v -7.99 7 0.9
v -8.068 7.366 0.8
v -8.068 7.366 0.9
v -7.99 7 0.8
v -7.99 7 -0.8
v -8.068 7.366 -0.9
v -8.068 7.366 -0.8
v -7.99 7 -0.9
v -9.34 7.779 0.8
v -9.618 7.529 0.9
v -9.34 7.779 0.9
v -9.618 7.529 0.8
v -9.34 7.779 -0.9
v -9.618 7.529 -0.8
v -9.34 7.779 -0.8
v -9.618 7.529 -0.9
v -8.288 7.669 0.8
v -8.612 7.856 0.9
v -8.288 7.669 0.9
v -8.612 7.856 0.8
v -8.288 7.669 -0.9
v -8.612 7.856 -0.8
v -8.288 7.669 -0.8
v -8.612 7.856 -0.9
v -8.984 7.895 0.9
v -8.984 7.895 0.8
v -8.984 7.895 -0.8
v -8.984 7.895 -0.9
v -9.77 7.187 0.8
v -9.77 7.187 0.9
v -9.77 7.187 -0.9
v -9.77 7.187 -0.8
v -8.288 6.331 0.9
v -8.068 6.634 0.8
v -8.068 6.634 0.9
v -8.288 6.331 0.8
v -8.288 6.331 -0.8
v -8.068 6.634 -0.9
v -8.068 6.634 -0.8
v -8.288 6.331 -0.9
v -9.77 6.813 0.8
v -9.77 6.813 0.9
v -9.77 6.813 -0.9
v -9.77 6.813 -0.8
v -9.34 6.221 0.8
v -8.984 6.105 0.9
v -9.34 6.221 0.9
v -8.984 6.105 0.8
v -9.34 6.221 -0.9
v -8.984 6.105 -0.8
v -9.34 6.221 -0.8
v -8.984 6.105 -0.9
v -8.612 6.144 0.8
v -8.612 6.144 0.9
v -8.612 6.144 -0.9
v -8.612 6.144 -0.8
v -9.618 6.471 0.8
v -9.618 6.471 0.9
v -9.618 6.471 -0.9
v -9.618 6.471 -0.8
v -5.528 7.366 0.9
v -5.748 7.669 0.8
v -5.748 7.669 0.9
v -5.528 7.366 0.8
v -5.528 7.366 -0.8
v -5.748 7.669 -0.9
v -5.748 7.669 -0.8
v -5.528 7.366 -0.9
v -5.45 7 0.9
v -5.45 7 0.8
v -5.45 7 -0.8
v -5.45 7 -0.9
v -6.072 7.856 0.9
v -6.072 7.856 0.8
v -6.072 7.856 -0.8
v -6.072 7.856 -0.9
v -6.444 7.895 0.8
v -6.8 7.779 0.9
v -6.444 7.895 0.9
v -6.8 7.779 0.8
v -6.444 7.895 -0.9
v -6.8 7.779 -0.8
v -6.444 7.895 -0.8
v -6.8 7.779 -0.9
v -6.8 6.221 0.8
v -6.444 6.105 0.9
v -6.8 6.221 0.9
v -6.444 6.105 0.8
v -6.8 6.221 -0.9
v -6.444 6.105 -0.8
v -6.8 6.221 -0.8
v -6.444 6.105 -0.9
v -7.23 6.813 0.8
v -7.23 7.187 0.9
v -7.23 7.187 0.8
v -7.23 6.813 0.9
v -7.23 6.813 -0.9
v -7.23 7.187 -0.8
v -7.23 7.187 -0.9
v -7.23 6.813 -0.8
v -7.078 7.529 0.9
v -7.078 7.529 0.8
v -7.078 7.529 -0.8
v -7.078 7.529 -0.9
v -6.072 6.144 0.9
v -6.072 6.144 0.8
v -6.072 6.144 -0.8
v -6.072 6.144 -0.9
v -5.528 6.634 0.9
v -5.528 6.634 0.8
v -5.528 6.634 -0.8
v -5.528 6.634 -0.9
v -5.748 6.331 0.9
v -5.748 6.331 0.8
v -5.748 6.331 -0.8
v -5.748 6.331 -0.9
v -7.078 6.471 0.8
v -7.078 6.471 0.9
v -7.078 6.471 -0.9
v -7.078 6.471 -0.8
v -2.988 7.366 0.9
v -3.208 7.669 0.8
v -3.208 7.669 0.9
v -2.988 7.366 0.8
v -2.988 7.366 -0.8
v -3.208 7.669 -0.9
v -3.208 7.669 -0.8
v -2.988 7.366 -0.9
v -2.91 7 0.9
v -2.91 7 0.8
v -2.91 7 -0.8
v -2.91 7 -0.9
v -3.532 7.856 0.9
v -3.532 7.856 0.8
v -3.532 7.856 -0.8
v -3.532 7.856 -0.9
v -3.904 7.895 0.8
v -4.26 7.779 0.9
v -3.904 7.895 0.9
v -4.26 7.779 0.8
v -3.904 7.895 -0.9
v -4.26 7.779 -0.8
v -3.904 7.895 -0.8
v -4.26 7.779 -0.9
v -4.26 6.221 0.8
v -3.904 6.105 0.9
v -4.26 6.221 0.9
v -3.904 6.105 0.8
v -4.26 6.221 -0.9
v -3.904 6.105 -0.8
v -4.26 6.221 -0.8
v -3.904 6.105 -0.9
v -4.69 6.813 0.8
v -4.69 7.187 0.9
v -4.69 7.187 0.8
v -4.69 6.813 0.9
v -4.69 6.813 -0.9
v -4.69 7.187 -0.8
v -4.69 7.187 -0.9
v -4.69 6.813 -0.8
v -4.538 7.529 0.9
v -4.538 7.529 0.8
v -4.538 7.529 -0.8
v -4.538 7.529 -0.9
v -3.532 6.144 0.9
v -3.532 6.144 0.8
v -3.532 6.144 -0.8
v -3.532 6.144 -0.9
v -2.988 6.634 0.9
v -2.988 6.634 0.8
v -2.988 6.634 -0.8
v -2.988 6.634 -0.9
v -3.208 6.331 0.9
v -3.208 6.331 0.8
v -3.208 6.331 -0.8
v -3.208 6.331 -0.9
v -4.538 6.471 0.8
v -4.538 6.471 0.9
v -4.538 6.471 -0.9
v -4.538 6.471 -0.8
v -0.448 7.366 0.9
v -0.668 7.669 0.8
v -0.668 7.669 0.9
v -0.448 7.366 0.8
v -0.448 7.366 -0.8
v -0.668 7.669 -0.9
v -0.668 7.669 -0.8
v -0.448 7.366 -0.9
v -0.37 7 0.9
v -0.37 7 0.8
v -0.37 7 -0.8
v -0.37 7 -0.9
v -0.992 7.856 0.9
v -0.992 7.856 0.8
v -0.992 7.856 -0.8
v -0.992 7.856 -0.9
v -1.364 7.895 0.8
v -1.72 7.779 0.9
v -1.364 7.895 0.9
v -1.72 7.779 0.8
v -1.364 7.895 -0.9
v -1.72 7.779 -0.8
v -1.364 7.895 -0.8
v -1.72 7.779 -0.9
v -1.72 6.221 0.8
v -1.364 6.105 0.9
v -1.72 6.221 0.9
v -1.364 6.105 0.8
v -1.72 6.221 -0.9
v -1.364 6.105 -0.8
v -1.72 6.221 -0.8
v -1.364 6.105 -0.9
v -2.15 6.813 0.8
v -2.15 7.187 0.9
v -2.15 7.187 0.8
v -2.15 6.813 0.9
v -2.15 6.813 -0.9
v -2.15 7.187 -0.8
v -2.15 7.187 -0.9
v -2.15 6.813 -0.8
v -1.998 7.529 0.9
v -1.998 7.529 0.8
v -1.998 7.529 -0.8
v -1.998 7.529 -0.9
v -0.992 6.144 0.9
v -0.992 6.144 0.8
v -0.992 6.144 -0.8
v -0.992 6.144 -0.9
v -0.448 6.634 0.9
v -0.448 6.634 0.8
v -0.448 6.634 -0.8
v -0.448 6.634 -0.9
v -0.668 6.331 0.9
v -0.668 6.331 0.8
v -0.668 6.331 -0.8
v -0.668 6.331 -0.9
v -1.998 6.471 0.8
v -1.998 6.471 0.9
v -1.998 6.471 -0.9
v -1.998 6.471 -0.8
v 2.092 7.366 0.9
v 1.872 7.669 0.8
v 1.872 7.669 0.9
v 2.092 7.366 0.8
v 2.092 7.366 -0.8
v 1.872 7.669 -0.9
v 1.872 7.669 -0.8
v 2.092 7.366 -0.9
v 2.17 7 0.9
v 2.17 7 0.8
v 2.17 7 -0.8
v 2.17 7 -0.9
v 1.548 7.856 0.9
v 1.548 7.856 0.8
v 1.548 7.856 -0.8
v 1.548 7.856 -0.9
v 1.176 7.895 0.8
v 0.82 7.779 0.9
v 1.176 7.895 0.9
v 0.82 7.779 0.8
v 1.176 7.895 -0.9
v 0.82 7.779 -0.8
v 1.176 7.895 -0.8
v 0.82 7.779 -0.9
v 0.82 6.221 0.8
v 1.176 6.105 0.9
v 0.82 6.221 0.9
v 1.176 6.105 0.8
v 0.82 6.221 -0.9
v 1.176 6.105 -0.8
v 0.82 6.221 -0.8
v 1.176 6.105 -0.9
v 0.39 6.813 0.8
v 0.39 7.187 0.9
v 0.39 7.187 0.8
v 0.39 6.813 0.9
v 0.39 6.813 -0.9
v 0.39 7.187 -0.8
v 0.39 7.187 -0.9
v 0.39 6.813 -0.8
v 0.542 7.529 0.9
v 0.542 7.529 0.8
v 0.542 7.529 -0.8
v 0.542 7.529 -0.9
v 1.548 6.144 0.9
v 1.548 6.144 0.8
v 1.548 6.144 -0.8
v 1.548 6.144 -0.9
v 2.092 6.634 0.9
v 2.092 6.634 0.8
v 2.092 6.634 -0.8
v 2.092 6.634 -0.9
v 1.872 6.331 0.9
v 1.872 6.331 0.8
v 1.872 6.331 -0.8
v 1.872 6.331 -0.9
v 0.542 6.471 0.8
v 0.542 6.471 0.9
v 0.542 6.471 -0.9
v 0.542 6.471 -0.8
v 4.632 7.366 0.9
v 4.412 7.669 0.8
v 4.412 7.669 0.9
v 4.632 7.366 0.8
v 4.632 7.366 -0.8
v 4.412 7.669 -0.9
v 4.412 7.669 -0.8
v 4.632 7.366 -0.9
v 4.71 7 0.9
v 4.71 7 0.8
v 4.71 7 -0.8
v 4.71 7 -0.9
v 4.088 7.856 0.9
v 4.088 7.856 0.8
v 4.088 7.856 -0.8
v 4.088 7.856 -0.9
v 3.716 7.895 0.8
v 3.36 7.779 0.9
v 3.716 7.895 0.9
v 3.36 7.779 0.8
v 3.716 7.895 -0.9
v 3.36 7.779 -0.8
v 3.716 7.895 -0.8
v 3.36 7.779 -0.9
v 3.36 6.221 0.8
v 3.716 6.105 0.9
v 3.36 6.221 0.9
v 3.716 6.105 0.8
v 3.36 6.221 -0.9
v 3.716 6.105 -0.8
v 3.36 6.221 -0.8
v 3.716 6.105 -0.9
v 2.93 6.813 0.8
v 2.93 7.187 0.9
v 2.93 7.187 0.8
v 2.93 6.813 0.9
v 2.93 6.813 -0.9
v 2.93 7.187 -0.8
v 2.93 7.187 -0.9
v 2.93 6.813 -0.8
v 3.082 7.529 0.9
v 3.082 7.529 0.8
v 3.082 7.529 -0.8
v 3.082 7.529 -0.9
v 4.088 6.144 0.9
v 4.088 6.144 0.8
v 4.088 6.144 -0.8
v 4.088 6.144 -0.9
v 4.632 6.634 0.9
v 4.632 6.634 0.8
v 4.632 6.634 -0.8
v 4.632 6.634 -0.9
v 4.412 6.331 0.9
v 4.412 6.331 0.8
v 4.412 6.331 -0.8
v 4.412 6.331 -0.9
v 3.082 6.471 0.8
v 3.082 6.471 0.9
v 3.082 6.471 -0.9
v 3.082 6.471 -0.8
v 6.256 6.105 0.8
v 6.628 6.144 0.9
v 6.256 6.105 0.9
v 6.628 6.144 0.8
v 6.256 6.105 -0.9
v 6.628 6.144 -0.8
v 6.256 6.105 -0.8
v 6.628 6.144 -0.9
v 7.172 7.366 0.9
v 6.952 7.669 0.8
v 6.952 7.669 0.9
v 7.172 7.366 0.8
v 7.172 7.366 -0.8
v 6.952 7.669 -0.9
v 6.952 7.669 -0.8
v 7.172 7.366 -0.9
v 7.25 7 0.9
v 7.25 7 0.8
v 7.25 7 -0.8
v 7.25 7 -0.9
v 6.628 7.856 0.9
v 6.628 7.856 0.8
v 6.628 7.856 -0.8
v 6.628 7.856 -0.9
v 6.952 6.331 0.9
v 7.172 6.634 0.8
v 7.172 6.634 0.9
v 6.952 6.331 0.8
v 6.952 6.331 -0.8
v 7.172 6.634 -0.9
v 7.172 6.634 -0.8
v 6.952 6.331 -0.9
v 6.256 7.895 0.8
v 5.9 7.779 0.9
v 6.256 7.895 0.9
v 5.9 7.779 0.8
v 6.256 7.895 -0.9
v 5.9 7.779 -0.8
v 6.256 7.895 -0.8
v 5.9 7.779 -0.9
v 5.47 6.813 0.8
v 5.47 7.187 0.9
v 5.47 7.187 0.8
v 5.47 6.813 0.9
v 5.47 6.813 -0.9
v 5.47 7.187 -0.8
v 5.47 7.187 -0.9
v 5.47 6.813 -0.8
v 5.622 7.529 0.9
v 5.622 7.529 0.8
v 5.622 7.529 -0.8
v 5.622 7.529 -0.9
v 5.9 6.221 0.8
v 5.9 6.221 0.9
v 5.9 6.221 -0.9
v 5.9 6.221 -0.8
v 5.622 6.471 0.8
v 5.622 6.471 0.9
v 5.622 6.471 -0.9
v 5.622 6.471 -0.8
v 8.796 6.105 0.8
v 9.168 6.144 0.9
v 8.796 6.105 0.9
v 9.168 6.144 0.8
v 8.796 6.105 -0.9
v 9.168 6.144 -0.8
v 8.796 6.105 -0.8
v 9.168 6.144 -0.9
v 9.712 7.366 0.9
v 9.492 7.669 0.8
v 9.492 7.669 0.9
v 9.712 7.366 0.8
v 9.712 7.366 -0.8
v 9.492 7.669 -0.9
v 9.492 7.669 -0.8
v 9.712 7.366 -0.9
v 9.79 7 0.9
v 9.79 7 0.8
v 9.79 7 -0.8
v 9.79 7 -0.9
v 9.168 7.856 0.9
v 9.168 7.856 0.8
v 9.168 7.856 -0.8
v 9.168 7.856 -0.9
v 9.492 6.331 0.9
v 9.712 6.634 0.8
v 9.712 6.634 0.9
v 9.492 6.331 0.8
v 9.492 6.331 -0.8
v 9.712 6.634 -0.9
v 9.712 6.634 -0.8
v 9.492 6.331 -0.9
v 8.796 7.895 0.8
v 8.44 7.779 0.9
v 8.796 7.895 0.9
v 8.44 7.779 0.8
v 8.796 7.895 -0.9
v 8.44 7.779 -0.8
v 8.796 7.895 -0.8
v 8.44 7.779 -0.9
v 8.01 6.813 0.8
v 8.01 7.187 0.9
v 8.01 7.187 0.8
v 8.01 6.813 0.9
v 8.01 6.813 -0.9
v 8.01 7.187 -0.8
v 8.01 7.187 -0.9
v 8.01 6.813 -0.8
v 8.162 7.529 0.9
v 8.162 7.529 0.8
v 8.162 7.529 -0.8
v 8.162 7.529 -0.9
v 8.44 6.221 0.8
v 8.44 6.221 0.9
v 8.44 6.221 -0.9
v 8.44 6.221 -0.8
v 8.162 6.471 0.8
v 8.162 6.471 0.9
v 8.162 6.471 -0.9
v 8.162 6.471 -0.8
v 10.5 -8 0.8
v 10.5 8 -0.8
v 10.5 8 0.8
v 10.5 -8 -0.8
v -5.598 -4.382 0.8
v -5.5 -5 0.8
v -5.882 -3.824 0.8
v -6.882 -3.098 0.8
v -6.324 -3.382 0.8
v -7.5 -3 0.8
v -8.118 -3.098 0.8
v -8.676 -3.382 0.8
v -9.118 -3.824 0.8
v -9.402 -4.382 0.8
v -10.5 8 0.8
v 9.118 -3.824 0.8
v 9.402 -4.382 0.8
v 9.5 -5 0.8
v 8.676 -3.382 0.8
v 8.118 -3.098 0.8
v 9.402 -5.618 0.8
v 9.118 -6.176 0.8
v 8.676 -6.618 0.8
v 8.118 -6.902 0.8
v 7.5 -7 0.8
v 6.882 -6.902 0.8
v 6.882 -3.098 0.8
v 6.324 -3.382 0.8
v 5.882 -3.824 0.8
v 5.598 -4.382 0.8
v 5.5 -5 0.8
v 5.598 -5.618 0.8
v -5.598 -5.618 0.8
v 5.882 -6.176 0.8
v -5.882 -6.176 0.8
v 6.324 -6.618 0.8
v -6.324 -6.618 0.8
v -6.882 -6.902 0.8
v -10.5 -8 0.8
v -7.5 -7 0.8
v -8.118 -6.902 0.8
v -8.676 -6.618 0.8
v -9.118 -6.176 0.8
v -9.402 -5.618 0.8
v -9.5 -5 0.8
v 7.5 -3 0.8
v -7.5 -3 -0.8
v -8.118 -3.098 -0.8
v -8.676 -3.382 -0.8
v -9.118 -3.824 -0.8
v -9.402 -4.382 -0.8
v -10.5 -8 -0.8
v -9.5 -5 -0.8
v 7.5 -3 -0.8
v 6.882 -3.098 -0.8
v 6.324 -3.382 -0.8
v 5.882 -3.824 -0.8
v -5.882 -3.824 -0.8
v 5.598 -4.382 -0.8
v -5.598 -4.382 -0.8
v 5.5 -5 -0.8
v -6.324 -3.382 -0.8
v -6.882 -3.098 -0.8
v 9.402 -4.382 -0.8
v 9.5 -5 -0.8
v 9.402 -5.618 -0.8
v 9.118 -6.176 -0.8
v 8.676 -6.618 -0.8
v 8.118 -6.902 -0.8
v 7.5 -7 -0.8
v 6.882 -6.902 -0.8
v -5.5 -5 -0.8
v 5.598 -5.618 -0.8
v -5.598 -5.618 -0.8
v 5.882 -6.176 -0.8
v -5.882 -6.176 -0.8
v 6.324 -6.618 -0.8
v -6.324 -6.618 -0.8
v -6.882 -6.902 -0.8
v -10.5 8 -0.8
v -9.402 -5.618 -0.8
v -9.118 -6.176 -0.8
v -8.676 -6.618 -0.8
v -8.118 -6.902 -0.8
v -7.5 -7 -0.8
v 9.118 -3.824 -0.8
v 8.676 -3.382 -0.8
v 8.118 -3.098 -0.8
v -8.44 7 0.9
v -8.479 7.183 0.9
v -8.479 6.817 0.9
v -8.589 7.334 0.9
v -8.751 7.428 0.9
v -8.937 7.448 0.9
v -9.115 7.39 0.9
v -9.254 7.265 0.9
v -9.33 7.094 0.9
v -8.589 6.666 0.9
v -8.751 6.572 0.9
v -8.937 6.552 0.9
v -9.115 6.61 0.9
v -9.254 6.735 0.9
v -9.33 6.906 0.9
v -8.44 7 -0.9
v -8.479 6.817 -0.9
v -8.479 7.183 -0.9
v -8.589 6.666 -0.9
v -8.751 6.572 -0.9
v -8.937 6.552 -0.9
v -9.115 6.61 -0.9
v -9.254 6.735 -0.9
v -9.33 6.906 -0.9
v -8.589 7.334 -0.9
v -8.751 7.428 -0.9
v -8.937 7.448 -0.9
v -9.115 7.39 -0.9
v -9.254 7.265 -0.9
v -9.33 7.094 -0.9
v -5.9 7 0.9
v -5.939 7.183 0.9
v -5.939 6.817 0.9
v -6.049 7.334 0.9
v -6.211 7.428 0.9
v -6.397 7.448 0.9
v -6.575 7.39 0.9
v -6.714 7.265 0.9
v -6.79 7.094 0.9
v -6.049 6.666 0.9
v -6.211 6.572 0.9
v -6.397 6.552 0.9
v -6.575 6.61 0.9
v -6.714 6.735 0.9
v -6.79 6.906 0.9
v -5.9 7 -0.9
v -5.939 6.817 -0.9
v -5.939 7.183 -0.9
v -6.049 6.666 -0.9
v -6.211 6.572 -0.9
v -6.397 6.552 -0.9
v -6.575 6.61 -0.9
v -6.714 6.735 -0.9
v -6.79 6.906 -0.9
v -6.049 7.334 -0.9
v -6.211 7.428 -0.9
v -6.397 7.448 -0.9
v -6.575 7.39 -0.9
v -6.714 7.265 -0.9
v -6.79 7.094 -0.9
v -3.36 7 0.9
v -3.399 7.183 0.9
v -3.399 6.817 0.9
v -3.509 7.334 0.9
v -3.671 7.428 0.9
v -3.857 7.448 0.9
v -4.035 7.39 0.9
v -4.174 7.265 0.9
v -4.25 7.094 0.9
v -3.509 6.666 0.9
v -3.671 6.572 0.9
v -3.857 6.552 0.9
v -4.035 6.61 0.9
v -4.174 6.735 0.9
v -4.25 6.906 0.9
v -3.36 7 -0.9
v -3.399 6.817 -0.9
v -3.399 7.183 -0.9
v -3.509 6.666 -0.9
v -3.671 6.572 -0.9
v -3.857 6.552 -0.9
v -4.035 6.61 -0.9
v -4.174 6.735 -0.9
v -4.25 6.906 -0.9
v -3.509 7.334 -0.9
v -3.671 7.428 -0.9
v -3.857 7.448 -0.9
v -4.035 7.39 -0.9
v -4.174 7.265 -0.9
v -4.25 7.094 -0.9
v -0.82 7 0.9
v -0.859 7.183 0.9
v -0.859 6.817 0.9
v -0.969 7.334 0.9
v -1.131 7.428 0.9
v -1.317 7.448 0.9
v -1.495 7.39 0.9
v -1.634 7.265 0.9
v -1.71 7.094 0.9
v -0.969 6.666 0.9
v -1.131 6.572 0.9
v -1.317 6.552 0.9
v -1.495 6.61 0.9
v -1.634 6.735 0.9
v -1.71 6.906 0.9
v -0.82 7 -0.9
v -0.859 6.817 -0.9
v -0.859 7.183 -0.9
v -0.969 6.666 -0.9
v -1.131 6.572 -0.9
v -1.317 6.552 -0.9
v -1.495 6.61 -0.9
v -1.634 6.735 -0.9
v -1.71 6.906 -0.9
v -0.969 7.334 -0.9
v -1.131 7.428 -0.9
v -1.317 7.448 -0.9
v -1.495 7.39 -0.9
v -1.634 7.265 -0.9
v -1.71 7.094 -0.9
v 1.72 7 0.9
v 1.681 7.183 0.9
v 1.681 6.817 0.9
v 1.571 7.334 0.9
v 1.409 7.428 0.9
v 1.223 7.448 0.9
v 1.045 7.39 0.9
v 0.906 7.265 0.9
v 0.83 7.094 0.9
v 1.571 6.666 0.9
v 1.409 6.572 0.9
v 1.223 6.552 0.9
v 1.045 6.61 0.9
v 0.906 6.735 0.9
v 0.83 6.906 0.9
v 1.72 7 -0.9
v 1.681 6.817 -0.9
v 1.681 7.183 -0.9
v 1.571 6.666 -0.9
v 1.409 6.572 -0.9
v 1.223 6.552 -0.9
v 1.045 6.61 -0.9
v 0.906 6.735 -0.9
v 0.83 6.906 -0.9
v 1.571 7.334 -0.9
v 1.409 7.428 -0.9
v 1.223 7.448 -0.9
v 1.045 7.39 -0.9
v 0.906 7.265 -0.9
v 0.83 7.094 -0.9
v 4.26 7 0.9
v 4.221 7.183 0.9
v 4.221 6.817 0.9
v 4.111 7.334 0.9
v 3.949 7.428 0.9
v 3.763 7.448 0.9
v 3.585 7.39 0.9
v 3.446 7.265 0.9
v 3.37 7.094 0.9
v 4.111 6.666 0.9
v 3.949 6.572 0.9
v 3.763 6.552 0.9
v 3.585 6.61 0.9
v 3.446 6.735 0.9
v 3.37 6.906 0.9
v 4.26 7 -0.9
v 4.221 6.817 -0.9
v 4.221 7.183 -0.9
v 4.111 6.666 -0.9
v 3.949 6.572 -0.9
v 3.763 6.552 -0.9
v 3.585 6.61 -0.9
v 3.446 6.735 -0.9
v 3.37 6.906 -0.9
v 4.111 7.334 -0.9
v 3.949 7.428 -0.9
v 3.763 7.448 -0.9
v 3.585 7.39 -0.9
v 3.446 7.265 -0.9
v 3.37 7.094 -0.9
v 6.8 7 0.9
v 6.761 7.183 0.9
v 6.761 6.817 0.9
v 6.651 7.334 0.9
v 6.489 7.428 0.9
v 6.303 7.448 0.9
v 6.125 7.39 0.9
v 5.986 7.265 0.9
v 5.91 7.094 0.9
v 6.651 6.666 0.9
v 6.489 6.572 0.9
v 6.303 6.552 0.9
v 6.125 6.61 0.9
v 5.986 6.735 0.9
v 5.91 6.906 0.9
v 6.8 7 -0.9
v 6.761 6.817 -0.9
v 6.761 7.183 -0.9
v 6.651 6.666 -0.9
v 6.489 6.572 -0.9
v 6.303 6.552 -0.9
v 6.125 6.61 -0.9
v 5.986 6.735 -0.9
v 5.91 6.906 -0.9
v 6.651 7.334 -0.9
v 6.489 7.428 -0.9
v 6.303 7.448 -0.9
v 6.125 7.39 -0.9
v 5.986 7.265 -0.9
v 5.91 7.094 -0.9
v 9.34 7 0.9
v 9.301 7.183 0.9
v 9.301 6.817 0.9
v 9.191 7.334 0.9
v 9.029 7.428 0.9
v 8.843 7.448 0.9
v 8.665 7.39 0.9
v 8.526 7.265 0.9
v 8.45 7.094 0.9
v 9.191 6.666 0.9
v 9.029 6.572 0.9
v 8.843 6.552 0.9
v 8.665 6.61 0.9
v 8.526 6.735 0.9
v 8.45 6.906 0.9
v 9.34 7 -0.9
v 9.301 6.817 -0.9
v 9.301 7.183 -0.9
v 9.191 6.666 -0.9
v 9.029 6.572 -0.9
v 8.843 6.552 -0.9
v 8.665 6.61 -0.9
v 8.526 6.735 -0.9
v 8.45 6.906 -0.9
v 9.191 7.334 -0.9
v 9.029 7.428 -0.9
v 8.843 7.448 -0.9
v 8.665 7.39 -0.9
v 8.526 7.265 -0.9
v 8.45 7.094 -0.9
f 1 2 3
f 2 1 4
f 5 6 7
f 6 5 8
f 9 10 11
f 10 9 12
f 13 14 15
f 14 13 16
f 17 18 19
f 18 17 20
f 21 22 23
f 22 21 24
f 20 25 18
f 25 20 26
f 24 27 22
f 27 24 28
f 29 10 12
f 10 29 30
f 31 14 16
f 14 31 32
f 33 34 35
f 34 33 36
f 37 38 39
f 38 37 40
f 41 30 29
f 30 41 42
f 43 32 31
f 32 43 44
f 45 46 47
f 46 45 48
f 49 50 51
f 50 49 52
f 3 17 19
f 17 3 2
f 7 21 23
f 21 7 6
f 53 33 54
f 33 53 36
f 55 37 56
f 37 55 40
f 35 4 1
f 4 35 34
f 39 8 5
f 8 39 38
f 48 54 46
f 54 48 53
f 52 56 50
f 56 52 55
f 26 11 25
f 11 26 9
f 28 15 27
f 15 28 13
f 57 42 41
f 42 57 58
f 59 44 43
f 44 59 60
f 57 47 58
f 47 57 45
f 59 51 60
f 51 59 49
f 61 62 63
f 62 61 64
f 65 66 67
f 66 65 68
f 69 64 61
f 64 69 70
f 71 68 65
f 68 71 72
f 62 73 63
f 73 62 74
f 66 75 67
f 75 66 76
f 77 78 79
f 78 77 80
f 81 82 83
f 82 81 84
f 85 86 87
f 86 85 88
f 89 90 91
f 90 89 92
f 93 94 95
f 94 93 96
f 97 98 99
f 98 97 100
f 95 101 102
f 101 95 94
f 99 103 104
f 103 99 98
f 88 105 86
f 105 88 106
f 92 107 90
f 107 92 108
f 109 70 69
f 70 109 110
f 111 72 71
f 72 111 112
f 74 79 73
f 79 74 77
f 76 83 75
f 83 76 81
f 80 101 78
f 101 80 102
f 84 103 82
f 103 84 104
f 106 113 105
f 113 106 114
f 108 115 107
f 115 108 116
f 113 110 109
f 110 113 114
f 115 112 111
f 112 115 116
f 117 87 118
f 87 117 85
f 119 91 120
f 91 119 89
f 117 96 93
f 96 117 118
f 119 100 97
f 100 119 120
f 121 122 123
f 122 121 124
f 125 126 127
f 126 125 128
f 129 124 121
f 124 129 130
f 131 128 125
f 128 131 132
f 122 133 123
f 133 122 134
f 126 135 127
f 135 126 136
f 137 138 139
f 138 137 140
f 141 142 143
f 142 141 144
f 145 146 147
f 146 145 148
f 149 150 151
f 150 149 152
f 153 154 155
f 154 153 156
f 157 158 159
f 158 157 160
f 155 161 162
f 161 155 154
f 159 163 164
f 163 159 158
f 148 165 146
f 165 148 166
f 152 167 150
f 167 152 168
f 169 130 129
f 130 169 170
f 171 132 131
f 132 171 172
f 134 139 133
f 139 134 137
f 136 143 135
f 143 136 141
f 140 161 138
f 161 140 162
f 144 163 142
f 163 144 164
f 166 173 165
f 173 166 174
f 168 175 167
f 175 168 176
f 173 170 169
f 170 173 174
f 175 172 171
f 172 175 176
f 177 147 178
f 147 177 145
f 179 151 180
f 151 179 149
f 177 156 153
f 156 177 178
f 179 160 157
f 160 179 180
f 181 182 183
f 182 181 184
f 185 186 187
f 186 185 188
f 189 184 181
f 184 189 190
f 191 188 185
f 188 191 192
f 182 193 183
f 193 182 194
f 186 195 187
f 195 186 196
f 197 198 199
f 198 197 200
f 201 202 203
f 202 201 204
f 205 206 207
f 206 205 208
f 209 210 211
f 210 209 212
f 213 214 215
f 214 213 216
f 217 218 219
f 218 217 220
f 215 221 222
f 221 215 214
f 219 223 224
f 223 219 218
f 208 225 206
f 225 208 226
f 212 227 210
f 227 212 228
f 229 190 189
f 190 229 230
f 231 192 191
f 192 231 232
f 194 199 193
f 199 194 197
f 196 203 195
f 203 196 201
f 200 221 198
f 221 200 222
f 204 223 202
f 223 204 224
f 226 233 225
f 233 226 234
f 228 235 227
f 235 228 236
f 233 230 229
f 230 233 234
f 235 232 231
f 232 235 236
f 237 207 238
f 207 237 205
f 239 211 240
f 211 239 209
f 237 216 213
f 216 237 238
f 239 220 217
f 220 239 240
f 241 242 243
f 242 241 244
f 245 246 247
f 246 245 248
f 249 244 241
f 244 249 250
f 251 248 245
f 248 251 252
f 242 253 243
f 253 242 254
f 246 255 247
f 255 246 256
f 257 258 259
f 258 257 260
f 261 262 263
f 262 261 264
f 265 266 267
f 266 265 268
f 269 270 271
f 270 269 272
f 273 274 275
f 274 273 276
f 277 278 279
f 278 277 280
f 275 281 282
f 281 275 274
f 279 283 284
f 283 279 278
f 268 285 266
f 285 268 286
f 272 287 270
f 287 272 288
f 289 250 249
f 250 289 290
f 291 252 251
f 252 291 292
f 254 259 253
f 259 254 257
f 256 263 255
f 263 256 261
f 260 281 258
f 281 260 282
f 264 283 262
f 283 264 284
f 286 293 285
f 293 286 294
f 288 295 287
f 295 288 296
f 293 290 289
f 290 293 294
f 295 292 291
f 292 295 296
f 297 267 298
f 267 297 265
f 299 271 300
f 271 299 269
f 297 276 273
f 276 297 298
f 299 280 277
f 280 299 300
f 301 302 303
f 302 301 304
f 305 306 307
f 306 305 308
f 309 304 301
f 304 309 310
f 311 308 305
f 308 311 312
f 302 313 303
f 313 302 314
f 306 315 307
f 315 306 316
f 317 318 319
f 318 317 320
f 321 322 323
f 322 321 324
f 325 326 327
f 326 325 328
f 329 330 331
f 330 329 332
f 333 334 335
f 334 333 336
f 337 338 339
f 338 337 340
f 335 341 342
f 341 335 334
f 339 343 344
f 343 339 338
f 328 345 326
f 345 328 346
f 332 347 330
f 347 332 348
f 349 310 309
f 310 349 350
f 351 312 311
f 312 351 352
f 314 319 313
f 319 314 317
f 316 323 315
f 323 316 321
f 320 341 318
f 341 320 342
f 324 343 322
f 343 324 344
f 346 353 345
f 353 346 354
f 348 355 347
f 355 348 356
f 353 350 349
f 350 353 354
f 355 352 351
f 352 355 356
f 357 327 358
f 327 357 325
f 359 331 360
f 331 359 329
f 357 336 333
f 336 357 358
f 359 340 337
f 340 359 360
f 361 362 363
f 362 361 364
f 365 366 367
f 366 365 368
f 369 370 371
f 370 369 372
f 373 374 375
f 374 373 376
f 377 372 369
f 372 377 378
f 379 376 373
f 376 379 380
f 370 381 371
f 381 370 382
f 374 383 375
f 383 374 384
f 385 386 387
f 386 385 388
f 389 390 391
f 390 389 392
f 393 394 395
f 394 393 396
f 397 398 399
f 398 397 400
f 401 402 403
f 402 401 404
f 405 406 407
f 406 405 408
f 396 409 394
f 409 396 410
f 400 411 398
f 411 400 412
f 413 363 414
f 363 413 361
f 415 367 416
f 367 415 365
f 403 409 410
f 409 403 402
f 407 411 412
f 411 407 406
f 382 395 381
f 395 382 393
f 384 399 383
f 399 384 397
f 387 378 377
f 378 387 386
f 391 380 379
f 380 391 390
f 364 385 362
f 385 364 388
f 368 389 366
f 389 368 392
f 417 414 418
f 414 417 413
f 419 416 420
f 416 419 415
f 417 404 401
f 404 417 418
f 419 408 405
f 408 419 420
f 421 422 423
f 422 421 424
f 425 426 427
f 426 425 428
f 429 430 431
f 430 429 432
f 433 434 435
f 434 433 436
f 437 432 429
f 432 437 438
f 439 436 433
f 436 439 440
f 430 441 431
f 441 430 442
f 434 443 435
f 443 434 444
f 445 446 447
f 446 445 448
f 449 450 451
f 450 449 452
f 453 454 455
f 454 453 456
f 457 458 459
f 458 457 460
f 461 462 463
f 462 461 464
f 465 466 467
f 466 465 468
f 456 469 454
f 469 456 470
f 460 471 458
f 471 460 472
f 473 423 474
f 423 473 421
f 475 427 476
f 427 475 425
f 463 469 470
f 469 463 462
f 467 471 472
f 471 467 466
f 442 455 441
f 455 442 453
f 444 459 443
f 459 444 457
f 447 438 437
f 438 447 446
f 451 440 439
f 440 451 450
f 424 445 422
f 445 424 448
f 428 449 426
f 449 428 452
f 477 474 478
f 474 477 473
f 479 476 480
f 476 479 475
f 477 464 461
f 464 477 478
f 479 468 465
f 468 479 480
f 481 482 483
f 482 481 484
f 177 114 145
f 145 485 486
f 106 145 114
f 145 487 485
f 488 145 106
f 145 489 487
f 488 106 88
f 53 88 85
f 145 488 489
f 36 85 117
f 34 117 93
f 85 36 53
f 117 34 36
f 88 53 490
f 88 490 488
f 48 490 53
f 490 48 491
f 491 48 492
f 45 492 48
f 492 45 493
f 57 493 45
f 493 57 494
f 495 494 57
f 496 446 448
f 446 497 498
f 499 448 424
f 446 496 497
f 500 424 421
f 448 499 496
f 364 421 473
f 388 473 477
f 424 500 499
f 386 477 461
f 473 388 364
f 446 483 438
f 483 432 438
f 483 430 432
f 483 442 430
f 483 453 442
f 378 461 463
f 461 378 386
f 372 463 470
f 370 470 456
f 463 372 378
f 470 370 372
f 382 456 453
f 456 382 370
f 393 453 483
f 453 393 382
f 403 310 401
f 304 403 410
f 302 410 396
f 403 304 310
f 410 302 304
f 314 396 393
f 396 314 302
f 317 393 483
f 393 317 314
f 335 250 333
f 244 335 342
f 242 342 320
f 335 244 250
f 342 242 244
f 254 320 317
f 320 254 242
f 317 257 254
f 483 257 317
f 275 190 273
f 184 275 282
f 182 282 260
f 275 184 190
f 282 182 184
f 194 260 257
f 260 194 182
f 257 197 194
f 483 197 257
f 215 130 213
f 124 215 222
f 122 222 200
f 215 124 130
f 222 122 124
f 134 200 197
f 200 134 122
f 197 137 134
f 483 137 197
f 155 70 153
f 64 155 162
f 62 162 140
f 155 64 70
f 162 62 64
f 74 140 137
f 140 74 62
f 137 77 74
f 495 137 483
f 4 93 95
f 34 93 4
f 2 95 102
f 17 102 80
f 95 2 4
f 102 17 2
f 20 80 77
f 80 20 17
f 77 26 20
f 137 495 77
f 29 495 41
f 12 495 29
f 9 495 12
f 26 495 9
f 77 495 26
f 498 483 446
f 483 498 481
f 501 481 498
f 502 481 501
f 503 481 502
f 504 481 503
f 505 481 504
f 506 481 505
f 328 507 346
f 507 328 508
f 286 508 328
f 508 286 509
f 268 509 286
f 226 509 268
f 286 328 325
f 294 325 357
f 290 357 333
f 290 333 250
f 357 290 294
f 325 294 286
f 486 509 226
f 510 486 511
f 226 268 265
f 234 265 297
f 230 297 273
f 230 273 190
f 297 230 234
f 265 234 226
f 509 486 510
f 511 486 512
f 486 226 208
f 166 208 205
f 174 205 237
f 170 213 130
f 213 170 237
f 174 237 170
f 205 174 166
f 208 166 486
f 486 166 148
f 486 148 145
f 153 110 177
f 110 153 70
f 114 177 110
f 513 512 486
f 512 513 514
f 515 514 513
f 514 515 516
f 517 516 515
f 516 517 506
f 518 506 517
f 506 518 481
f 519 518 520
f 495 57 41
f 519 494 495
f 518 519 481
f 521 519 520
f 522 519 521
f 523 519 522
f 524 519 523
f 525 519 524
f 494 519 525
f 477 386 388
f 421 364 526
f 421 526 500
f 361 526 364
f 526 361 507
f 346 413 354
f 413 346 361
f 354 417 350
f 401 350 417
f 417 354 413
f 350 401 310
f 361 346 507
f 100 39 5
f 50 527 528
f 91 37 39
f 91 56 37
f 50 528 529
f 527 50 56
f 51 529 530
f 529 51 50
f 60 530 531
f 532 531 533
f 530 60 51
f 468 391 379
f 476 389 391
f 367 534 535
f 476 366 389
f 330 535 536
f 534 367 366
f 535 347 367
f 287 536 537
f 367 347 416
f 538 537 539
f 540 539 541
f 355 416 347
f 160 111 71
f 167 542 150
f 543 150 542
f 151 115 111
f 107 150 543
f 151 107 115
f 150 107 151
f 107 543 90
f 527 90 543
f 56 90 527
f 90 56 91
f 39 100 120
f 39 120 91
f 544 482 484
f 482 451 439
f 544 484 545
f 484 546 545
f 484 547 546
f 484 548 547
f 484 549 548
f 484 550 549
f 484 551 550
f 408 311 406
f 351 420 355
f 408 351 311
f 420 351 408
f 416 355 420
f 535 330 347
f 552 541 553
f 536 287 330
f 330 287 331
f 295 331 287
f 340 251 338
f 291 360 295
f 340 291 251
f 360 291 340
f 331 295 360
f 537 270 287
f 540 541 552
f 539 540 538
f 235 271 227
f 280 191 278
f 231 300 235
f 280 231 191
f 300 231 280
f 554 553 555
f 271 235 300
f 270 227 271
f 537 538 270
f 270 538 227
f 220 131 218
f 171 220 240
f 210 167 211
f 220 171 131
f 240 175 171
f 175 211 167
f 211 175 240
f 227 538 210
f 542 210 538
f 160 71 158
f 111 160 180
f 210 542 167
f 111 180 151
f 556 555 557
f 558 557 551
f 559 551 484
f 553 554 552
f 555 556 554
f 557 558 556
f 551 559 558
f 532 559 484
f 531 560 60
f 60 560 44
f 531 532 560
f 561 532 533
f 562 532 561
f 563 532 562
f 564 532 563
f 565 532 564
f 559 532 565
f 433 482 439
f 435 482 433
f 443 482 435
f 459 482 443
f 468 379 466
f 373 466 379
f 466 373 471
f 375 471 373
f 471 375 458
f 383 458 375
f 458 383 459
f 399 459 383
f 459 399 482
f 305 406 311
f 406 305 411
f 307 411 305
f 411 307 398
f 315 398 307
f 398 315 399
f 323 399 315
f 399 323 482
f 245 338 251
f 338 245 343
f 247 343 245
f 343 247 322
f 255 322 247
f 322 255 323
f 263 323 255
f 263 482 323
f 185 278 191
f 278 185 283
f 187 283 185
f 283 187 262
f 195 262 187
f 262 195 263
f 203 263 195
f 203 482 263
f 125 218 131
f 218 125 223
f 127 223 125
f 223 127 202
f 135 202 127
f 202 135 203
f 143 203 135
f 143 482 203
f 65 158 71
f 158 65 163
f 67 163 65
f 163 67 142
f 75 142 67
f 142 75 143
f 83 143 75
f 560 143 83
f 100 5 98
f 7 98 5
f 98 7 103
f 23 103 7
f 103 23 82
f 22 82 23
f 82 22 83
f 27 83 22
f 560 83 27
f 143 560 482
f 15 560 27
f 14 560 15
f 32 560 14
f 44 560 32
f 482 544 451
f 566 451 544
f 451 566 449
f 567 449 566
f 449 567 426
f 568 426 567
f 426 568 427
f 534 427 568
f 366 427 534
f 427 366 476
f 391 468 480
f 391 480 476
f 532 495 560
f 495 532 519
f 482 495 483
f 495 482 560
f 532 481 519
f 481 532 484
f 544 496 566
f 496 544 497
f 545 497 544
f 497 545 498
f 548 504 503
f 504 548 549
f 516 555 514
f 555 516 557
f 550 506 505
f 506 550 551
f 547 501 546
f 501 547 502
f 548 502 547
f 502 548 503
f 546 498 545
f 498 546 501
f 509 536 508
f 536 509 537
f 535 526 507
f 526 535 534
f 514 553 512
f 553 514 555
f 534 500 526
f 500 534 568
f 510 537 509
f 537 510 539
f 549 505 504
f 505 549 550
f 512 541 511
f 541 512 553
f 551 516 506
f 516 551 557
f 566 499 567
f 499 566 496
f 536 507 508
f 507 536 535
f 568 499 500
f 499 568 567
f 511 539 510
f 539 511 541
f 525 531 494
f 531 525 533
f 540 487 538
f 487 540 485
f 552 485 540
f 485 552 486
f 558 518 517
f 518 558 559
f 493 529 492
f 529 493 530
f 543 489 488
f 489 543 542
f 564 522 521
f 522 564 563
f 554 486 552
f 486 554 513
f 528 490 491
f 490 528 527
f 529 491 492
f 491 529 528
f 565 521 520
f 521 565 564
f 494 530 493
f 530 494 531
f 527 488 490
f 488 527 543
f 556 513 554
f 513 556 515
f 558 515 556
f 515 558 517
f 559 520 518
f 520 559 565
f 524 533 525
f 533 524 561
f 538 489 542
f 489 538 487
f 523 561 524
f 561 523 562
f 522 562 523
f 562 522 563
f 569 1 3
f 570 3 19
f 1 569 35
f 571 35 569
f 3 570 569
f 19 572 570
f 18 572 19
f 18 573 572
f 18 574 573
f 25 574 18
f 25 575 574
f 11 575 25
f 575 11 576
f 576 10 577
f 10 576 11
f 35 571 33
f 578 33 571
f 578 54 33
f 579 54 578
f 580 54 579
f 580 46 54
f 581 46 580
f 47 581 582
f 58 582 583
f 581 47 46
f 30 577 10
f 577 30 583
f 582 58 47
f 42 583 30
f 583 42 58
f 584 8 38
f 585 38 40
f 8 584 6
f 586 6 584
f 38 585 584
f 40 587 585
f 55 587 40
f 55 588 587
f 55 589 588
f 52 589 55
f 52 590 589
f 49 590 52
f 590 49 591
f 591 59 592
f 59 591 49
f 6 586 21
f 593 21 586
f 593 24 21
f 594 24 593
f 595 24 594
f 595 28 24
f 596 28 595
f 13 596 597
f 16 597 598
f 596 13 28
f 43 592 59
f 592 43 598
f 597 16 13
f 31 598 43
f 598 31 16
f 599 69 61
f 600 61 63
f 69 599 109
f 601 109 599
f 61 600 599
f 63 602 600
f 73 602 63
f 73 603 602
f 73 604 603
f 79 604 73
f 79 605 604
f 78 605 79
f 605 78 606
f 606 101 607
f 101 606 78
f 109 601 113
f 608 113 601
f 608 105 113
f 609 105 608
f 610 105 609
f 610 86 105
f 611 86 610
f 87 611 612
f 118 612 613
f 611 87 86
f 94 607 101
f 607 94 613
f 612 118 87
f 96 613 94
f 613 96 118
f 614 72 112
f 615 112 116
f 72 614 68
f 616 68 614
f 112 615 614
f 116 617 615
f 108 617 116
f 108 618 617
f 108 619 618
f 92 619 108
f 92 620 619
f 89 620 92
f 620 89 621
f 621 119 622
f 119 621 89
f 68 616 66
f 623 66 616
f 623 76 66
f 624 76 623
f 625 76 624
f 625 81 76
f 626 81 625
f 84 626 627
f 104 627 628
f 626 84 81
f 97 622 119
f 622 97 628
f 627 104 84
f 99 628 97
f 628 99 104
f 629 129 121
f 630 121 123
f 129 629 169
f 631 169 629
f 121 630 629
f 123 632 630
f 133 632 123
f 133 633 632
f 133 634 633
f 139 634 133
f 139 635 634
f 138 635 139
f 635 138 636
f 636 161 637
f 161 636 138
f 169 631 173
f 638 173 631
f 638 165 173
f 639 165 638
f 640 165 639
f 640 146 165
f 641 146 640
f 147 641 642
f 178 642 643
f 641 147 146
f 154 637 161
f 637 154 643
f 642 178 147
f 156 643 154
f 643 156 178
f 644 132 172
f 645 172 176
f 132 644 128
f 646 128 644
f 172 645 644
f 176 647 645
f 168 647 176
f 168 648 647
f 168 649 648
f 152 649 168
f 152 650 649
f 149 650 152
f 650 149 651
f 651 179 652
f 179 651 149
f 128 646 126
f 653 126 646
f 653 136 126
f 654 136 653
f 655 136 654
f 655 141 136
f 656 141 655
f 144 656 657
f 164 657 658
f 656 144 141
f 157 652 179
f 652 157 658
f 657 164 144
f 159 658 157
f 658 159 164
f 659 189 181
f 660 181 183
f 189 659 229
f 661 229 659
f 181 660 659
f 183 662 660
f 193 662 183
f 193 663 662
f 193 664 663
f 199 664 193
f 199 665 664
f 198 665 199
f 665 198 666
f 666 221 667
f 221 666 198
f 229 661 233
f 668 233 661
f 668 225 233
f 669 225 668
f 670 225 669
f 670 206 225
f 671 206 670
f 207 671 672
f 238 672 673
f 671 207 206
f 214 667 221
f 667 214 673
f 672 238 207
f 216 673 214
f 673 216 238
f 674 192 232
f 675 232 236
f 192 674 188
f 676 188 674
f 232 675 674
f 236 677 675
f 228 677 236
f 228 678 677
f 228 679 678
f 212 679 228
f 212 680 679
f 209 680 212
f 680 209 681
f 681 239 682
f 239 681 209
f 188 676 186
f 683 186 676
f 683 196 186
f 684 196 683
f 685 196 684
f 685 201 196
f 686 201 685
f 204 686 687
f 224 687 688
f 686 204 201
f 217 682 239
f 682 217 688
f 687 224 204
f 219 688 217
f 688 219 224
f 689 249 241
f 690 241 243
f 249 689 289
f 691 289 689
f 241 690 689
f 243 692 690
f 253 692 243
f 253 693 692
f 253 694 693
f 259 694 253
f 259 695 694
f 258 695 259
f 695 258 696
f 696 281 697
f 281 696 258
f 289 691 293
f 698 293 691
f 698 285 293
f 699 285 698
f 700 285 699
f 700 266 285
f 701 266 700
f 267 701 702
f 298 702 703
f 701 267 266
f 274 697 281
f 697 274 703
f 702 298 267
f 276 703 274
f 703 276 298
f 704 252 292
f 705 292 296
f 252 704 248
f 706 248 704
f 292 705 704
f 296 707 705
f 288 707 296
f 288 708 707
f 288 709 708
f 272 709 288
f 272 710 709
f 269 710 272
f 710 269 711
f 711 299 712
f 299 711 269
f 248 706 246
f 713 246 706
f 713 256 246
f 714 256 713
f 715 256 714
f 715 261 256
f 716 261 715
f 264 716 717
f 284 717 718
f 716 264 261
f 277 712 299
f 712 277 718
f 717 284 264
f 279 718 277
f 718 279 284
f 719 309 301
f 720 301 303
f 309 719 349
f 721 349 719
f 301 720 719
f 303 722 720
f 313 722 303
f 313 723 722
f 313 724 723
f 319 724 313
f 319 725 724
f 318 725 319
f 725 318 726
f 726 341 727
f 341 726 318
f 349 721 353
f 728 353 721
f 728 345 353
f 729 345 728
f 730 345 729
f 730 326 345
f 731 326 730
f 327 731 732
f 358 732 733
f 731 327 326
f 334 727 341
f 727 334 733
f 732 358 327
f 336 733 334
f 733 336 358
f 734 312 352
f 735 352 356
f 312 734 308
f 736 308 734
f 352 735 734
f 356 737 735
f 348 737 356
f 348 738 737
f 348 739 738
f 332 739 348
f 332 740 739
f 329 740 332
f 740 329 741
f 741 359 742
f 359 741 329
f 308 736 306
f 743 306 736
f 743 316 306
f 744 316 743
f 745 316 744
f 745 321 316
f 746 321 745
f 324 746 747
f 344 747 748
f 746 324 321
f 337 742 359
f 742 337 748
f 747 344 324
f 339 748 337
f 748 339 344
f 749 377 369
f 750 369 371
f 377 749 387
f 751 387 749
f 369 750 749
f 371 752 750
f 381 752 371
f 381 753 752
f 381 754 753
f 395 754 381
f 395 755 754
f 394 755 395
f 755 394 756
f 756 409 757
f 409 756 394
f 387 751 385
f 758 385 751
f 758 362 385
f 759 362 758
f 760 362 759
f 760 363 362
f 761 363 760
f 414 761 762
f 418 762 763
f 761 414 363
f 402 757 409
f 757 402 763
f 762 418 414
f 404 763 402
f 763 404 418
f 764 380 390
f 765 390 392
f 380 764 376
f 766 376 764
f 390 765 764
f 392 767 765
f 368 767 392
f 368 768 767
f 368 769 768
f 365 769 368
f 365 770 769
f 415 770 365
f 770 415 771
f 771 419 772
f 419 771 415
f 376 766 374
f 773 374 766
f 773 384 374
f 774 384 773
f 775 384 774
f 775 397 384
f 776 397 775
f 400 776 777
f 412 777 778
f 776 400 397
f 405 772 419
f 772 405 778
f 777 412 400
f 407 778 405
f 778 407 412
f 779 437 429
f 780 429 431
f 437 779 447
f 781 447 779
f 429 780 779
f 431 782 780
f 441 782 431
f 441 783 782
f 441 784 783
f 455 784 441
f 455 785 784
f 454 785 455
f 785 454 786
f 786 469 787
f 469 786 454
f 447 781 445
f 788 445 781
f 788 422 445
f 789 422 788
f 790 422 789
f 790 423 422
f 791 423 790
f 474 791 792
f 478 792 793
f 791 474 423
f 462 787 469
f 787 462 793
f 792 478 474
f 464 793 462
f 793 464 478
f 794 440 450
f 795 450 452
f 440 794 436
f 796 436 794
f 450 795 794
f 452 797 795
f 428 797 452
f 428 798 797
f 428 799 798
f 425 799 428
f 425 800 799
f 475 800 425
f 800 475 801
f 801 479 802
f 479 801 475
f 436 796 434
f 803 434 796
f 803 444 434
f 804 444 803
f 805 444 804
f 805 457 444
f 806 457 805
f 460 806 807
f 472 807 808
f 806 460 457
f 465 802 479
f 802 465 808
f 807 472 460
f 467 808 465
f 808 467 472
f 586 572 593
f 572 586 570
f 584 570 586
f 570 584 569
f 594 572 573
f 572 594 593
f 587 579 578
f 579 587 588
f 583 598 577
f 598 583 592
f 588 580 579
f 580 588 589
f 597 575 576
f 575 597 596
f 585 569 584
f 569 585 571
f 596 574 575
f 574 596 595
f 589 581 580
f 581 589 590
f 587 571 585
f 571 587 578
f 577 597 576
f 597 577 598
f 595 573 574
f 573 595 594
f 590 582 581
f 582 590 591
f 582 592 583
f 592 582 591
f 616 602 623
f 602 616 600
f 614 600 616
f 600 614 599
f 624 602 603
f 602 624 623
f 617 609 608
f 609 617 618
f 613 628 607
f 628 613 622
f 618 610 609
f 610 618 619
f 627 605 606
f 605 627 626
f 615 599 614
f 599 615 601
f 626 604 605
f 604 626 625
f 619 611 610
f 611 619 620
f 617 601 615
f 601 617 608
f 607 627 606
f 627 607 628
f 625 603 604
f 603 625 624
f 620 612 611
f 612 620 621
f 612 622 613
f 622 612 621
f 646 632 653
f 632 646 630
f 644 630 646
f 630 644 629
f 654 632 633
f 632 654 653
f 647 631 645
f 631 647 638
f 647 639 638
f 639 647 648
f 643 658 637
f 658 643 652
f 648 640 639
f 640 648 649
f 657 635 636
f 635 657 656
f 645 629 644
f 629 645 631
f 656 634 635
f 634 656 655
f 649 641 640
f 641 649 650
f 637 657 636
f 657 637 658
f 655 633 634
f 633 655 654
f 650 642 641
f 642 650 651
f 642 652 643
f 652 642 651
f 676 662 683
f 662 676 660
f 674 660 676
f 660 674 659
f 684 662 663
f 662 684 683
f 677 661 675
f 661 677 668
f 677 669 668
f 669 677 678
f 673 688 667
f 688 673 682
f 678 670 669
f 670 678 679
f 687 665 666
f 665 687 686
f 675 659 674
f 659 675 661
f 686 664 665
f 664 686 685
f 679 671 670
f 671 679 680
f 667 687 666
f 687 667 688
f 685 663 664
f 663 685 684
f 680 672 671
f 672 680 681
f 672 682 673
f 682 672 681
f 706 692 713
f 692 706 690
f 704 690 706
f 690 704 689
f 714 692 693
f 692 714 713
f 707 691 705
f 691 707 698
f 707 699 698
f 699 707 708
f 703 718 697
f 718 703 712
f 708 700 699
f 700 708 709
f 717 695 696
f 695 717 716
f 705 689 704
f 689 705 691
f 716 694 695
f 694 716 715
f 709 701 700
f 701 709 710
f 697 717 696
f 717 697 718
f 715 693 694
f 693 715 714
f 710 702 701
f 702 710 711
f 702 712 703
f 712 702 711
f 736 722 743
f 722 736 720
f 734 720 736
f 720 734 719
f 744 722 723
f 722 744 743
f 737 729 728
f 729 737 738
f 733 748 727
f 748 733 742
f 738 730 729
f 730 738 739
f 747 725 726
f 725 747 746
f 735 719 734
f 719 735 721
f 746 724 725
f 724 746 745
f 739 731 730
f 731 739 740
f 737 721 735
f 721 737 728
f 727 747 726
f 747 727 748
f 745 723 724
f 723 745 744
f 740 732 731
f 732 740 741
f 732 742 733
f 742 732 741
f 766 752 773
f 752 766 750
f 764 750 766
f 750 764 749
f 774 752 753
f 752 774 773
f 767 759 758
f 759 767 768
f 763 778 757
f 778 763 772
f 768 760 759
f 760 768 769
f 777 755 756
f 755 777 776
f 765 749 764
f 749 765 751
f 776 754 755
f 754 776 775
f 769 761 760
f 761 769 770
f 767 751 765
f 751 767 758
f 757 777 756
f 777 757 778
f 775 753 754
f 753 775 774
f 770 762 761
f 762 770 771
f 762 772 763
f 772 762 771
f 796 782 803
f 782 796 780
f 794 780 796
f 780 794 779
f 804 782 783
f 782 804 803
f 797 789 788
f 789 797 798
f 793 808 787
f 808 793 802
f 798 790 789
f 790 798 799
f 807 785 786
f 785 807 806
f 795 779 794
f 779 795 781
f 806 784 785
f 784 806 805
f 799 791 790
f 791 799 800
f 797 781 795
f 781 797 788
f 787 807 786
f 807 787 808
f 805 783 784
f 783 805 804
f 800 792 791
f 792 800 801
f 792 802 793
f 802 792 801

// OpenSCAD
color("blue")difference(){
    color("blue")cube([21,16,1.6],true);
    for (i=[1.27:2.54:20])translate([i-2.54*4,7,-0.9])cylinder(d=1.8,h=1.8,$fn=15);
    translate([7.5,-5,0])cylinder(d=4,h=3,$fn=20,center=true);
    translate([-7.5,-5,0])cylinder(d=4,h=3,$fn=20,center=true);
    }

color("gold")difference(){
    for (i=[1.27:2.54:20])color("gold")translate([i-2.54*4,7,-0.9])cylinder(d=1.8,h=1.8,$fn=15);
    for (i=[1.27:2.54:20])color("gold")translate([i-2.54*4,7,-1])cylinder(d=0.9,h=5,$fn=15);
    }
